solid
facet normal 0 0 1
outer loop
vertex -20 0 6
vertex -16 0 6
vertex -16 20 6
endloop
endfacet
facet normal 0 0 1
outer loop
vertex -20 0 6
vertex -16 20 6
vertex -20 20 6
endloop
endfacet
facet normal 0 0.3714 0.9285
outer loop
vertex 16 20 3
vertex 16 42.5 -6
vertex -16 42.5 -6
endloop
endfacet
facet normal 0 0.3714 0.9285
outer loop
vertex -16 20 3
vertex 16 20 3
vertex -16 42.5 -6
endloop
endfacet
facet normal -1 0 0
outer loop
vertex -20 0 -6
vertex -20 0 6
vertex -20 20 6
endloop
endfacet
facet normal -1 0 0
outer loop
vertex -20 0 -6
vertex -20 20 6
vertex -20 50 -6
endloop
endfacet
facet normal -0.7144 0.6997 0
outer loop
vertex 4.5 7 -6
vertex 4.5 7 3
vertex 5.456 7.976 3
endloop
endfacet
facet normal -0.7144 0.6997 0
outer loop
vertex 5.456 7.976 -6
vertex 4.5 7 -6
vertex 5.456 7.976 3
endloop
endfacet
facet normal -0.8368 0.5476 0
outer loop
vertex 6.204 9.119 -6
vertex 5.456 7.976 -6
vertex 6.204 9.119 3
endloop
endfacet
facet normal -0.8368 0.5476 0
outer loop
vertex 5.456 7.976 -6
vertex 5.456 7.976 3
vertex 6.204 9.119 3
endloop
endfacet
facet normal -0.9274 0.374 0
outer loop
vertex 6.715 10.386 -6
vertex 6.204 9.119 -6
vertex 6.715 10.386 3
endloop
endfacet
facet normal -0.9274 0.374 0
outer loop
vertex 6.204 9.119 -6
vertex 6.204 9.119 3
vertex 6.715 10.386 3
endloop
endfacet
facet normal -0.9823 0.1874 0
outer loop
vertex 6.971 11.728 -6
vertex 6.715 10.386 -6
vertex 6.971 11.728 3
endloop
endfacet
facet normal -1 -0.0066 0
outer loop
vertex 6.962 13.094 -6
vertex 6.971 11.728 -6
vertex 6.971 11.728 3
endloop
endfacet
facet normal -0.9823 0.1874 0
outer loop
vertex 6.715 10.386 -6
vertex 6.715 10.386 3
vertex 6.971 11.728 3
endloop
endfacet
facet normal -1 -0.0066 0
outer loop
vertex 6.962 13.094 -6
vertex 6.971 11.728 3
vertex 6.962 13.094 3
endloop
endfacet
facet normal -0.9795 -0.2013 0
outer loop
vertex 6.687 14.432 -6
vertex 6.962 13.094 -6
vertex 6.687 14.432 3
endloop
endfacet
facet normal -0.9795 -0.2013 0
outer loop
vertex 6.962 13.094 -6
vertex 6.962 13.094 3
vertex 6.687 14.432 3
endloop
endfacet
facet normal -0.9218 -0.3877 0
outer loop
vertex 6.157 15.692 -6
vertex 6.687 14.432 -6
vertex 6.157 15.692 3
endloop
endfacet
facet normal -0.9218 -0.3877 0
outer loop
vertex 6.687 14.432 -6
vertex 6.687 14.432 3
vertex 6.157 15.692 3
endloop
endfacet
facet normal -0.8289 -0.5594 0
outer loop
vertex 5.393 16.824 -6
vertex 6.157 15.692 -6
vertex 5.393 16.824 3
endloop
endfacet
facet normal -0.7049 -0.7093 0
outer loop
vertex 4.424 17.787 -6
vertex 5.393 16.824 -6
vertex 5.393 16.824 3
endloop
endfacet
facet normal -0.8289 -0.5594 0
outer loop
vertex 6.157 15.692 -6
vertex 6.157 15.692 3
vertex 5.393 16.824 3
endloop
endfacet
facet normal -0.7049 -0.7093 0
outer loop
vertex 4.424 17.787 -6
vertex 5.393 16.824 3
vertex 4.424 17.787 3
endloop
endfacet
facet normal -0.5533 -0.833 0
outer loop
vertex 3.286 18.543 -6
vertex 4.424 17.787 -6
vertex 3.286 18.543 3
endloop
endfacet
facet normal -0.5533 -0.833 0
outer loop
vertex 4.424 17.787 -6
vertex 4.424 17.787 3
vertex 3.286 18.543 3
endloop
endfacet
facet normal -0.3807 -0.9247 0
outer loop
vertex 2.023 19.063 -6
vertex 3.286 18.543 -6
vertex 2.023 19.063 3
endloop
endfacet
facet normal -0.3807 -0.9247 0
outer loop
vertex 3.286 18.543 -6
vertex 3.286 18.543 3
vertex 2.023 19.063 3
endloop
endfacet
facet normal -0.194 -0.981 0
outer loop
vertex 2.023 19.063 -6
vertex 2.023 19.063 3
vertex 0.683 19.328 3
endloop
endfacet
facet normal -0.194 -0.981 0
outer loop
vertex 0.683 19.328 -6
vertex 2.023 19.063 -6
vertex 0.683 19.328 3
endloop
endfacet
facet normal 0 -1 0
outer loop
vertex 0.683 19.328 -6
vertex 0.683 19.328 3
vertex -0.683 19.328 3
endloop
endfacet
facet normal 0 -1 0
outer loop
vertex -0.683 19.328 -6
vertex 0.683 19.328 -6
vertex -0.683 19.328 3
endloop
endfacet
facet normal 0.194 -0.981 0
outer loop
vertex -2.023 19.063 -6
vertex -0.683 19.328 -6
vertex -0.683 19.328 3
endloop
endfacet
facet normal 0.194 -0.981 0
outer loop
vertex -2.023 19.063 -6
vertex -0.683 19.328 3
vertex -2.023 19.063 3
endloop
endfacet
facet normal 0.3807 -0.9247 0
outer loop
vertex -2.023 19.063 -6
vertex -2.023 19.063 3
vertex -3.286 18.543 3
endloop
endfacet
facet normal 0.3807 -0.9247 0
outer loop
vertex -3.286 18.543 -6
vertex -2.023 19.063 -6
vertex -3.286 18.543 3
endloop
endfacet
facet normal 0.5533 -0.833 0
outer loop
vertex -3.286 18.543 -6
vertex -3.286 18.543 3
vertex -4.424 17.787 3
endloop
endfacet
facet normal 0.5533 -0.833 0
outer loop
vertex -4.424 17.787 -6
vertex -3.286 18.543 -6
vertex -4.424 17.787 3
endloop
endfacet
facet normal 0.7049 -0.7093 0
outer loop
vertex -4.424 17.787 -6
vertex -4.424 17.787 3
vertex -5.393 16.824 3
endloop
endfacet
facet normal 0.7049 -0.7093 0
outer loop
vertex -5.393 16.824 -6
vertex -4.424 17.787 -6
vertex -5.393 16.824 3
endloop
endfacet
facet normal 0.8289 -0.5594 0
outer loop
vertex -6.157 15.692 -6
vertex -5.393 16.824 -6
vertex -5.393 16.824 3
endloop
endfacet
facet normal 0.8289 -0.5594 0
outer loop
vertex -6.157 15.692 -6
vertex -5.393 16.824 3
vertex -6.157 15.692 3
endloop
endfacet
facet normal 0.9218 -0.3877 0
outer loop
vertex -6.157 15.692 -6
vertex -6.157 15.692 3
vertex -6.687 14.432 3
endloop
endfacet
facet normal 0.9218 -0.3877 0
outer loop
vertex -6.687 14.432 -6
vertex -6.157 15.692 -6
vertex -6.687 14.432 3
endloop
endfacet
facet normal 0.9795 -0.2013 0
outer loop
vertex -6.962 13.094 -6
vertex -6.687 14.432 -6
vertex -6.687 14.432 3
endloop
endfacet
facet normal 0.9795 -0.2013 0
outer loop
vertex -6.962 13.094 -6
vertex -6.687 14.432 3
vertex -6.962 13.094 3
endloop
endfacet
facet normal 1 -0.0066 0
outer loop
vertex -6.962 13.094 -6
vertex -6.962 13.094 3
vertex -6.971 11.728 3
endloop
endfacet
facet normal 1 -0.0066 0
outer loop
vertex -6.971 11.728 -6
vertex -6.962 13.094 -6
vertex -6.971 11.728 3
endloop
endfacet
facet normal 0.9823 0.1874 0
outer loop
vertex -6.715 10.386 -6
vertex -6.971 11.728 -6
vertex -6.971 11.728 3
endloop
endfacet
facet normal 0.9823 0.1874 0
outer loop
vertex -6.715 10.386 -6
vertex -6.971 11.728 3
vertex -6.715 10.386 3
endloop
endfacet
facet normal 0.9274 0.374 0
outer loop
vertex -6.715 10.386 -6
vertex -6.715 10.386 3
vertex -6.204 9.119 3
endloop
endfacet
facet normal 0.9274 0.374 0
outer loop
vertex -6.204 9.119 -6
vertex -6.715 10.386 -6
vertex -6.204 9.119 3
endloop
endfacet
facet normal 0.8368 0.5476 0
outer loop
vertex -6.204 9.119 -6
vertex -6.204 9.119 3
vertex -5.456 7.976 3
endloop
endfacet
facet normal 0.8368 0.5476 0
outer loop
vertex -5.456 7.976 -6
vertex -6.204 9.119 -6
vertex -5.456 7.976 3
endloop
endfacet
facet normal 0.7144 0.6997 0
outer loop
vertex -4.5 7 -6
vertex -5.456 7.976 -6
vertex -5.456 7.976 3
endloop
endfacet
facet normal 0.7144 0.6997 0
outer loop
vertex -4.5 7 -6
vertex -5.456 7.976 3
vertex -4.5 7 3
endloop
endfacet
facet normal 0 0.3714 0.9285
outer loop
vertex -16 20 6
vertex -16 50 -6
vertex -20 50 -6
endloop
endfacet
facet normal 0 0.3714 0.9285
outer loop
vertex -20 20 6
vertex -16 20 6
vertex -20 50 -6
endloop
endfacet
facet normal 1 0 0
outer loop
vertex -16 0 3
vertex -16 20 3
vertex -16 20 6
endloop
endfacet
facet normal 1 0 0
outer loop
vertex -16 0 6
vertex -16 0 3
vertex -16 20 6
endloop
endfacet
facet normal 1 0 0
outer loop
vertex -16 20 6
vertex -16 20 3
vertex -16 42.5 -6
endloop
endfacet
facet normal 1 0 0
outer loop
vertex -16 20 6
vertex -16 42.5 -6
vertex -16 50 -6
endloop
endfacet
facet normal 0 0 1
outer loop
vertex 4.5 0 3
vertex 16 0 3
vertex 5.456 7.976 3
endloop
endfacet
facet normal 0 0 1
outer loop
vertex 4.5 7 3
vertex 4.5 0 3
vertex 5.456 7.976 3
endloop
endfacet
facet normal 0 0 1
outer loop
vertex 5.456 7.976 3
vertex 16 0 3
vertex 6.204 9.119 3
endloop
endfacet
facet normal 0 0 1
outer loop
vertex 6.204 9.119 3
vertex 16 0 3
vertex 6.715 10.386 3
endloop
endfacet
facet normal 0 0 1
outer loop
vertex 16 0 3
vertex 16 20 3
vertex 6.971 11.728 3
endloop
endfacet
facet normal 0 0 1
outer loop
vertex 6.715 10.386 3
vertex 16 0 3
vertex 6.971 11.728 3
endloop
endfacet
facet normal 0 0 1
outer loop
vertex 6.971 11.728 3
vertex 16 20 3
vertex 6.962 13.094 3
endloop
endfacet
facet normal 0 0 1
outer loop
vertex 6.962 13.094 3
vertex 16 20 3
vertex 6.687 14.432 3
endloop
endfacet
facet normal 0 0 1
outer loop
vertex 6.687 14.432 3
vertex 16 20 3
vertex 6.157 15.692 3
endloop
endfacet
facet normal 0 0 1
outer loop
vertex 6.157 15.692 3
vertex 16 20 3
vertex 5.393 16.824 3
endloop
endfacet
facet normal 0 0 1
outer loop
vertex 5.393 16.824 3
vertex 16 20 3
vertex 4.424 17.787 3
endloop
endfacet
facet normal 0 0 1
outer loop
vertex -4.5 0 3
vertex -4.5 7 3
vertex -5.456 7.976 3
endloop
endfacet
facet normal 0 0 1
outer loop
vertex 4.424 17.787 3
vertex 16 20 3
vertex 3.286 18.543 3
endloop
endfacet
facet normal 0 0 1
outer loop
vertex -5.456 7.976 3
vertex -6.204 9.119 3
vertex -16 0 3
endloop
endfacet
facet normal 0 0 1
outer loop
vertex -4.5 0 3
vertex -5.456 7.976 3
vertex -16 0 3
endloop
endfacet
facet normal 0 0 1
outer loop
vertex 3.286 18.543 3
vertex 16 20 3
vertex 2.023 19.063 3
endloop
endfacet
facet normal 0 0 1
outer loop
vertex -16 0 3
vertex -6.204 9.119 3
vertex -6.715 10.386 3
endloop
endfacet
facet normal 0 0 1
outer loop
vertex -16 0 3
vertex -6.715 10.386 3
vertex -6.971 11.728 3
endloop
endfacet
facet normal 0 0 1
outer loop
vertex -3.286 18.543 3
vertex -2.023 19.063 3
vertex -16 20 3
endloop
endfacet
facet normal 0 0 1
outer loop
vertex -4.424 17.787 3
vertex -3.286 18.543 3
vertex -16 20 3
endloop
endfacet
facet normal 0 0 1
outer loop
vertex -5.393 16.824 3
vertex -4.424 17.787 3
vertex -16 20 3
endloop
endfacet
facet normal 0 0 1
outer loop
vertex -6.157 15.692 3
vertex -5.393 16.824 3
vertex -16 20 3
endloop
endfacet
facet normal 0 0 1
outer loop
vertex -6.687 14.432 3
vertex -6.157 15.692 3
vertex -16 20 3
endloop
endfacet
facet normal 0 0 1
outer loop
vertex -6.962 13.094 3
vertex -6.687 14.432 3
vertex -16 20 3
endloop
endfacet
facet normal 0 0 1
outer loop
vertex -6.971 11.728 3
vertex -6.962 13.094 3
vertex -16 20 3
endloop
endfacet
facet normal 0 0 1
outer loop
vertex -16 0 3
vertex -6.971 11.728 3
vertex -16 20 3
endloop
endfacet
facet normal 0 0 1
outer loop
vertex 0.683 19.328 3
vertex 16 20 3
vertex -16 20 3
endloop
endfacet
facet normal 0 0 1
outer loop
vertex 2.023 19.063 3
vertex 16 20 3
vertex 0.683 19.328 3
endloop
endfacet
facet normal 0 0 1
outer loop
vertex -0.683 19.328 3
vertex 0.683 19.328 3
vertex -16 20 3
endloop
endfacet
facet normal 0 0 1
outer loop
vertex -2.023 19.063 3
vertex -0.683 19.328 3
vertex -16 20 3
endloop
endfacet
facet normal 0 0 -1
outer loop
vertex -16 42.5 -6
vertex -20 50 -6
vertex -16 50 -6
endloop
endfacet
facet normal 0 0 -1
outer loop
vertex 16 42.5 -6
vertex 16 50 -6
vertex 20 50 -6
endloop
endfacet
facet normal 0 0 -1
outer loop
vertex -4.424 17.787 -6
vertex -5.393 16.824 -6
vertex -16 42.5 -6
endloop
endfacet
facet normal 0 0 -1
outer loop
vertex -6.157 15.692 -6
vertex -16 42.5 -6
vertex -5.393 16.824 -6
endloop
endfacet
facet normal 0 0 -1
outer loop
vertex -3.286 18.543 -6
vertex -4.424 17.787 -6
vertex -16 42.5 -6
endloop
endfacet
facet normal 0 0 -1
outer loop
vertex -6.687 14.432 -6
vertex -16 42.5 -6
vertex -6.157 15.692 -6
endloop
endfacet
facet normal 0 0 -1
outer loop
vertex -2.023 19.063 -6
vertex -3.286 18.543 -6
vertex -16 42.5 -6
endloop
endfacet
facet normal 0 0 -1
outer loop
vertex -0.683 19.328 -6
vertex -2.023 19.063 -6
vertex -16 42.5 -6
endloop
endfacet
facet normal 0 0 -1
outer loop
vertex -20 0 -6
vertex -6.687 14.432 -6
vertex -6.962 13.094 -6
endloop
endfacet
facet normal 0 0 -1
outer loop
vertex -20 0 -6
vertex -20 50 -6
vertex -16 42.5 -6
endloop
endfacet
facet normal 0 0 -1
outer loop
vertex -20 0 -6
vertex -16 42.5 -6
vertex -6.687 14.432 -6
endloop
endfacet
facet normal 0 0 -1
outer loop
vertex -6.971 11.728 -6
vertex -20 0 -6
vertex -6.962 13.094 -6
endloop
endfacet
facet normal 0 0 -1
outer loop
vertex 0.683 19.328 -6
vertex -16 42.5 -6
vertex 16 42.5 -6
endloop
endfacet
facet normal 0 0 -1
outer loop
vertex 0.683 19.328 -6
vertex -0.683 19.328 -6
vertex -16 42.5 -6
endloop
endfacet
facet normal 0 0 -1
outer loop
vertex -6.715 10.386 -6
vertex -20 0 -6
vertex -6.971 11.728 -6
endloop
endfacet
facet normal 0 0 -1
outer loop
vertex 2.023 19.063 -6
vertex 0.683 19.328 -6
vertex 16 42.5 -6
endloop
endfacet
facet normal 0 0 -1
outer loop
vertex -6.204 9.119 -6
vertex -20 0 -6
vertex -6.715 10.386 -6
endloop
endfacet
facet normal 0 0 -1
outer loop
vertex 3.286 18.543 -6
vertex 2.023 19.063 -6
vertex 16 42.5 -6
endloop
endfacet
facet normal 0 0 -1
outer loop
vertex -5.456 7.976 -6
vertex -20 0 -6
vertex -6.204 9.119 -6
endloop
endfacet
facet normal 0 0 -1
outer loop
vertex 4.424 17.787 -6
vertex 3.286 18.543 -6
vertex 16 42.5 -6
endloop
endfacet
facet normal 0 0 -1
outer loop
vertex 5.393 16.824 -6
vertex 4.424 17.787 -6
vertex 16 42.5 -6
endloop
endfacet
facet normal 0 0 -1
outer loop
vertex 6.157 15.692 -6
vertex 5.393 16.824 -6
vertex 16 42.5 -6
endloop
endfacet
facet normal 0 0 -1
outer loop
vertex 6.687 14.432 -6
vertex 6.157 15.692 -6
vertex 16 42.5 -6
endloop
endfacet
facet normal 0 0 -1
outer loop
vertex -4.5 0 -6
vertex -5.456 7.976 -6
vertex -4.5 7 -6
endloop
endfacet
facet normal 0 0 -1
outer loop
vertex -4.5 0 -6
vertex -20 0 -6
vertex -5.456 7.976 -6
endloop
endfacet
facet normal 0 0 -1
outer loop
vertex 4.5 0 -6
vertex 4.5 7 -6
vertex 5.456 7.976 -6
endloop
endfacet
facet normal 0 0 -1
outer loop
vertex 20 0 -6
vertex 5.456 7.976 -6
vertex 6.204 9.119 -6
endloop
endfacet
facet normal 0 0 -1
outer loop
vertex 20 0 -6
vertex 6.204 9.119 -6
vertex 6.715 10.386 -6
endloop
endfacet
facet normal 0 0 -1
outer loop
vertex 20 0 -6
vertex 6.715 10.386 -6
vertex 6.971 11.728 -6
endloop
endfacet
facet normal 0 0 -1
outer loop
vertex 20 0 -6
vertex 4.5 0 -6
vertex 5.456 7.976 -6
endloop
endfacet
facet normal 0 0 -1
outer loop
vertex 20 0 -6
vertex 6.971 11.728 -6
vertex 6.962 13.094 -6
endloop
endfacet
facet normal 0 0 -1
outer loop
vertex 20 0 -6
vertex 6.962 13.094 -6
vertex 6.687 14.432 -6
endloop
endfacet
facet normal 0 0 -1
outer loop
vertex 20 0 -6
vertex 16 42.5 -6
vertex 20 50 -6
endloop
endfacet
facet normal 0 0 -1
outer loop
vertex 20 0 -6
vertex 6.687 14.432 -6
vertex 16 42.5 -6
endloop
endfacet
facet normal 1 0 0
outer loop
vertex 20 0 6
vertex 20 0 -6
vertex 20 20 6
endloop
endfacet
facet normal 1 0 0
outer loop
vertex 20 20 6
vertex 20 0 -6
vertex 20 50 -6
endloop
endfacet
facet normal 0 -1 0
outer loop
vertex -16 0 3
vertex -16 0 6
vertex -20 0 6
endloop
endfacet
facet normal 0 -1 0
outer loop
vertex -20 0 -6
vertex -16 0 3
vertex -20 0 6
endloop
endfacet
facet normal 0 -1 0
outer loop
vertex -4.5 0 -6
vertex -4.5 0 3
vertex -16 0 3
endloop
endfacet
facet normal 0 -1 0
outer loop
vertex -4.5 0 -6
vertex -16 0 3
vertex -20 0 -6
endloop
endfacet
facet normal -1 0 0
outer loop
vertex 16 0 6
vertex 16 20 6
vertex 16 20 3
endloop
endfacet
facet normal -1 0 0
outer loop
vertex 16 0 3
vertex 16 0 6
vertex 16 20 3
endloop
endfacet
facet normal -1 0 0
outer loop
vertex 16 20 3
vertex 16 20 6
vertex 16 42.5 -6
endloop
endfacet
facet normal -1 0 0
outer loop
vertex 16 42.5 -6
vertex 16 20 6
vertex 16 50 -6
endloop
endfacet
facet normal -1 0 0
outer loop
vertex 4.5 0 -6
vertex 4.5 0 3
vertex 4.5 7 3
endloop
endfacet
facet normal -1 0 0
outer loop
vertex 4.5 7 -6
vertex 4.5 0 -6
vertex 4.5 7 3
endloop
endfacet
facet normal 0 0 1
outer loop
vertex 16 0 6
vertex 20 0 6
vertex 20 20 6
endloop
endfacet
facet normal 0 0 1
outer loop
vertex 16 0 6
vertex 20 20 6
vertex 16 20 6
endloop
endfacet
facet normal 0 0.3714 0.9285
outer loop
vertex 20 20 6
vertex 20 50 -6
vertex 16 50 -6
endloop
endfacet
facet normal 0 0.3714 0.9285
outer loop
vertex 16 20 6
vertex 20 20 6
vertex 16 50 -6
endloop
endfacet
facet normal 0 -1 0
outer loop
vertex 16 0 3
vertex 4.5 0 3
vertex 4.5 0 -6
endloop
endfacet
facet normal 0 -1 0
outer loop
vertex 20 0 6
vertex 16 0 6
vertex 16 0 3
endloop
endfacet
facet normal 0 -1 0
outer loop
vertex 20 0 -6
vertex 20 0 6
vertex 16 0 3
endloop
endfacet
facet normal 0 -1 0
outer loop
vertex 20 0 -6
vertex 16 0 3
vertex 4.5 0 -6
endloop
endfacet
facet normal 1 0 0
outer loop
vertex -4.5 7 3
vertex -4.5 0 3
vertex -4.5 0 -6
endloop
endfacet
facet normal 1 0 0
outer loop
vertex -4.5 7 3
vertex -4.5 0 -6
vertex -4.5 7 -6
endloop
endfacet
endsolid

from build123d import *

# Parameters (mm, degrees)
POCKET_DEPTH         = 24.001
POCKET_DEPTH_BACK    = 0.001
SKETCH004_W          = 40
SKETCH004_H          = 12
POCKET001_DEPTH      = 50.001
POCKET001_DEPTH_BACK = 0.001


with BuildPart() as part:
    # AdditivePipe: sweep along a path in Sketch
    with BuildLine(Plane.YZ) as additivepipe_path:
        Line((0, 0), (20, 0))
        Line((20, 0), (50, -12))
    # Sketch001 → AdditivePipe (sweep)
    with BuildSketch(Plane.XZ):
        Polygon((-20, 6), (-20, -6), (20, -6), (20, 6), (16, 6), (16, 3), (9, 3), (-9, 3), (-16, 3), (-16, 6), align=None)
    sweep(path=additivepipe_path.line)

    # Sketch003 → Pocket (cut, two sides)
    with BuildSketch(Plane(origin=(0, 0, 6), x_dir=(-1, 0, 0), z_dir=(0, 0, 1))) as pocket_sk:
        with BuildLine():
            Line((-4.5, 0), (4.5, 0))
            Line((4.5, 0), (4.5, -7))
            ThreePointArc((-4.5, -7), (0, -19.361903), (4.5, -7))
            Line((-4.5, 0), (-4.5, -7))
        make_face()
    extrude(amount=-POCKET_DEPTH, mode=Mode.SUBTRACT)
    extrude(pocket_sk.sketch, amount=POCKET_DEPTH_BACK, mode=Mode.SUBTRACT)

    # Sketch004 → Pocket001 (cut, two sides)
    with BuildSketch(Plane.XZ) as pocket001_sk:
        with Locations((0, -12)):
            Rectangle(SKETCH004_W, SKETCH004_H)
    extrude(amount=-POCKET001_DEPTH, mode=Mode.SUBTRACT)
    extrude(pocket001_sk.sketch, amount=POCKET001_DEPTH_BACK, mode=Mode.SUBTRACT)


solid = part.part
